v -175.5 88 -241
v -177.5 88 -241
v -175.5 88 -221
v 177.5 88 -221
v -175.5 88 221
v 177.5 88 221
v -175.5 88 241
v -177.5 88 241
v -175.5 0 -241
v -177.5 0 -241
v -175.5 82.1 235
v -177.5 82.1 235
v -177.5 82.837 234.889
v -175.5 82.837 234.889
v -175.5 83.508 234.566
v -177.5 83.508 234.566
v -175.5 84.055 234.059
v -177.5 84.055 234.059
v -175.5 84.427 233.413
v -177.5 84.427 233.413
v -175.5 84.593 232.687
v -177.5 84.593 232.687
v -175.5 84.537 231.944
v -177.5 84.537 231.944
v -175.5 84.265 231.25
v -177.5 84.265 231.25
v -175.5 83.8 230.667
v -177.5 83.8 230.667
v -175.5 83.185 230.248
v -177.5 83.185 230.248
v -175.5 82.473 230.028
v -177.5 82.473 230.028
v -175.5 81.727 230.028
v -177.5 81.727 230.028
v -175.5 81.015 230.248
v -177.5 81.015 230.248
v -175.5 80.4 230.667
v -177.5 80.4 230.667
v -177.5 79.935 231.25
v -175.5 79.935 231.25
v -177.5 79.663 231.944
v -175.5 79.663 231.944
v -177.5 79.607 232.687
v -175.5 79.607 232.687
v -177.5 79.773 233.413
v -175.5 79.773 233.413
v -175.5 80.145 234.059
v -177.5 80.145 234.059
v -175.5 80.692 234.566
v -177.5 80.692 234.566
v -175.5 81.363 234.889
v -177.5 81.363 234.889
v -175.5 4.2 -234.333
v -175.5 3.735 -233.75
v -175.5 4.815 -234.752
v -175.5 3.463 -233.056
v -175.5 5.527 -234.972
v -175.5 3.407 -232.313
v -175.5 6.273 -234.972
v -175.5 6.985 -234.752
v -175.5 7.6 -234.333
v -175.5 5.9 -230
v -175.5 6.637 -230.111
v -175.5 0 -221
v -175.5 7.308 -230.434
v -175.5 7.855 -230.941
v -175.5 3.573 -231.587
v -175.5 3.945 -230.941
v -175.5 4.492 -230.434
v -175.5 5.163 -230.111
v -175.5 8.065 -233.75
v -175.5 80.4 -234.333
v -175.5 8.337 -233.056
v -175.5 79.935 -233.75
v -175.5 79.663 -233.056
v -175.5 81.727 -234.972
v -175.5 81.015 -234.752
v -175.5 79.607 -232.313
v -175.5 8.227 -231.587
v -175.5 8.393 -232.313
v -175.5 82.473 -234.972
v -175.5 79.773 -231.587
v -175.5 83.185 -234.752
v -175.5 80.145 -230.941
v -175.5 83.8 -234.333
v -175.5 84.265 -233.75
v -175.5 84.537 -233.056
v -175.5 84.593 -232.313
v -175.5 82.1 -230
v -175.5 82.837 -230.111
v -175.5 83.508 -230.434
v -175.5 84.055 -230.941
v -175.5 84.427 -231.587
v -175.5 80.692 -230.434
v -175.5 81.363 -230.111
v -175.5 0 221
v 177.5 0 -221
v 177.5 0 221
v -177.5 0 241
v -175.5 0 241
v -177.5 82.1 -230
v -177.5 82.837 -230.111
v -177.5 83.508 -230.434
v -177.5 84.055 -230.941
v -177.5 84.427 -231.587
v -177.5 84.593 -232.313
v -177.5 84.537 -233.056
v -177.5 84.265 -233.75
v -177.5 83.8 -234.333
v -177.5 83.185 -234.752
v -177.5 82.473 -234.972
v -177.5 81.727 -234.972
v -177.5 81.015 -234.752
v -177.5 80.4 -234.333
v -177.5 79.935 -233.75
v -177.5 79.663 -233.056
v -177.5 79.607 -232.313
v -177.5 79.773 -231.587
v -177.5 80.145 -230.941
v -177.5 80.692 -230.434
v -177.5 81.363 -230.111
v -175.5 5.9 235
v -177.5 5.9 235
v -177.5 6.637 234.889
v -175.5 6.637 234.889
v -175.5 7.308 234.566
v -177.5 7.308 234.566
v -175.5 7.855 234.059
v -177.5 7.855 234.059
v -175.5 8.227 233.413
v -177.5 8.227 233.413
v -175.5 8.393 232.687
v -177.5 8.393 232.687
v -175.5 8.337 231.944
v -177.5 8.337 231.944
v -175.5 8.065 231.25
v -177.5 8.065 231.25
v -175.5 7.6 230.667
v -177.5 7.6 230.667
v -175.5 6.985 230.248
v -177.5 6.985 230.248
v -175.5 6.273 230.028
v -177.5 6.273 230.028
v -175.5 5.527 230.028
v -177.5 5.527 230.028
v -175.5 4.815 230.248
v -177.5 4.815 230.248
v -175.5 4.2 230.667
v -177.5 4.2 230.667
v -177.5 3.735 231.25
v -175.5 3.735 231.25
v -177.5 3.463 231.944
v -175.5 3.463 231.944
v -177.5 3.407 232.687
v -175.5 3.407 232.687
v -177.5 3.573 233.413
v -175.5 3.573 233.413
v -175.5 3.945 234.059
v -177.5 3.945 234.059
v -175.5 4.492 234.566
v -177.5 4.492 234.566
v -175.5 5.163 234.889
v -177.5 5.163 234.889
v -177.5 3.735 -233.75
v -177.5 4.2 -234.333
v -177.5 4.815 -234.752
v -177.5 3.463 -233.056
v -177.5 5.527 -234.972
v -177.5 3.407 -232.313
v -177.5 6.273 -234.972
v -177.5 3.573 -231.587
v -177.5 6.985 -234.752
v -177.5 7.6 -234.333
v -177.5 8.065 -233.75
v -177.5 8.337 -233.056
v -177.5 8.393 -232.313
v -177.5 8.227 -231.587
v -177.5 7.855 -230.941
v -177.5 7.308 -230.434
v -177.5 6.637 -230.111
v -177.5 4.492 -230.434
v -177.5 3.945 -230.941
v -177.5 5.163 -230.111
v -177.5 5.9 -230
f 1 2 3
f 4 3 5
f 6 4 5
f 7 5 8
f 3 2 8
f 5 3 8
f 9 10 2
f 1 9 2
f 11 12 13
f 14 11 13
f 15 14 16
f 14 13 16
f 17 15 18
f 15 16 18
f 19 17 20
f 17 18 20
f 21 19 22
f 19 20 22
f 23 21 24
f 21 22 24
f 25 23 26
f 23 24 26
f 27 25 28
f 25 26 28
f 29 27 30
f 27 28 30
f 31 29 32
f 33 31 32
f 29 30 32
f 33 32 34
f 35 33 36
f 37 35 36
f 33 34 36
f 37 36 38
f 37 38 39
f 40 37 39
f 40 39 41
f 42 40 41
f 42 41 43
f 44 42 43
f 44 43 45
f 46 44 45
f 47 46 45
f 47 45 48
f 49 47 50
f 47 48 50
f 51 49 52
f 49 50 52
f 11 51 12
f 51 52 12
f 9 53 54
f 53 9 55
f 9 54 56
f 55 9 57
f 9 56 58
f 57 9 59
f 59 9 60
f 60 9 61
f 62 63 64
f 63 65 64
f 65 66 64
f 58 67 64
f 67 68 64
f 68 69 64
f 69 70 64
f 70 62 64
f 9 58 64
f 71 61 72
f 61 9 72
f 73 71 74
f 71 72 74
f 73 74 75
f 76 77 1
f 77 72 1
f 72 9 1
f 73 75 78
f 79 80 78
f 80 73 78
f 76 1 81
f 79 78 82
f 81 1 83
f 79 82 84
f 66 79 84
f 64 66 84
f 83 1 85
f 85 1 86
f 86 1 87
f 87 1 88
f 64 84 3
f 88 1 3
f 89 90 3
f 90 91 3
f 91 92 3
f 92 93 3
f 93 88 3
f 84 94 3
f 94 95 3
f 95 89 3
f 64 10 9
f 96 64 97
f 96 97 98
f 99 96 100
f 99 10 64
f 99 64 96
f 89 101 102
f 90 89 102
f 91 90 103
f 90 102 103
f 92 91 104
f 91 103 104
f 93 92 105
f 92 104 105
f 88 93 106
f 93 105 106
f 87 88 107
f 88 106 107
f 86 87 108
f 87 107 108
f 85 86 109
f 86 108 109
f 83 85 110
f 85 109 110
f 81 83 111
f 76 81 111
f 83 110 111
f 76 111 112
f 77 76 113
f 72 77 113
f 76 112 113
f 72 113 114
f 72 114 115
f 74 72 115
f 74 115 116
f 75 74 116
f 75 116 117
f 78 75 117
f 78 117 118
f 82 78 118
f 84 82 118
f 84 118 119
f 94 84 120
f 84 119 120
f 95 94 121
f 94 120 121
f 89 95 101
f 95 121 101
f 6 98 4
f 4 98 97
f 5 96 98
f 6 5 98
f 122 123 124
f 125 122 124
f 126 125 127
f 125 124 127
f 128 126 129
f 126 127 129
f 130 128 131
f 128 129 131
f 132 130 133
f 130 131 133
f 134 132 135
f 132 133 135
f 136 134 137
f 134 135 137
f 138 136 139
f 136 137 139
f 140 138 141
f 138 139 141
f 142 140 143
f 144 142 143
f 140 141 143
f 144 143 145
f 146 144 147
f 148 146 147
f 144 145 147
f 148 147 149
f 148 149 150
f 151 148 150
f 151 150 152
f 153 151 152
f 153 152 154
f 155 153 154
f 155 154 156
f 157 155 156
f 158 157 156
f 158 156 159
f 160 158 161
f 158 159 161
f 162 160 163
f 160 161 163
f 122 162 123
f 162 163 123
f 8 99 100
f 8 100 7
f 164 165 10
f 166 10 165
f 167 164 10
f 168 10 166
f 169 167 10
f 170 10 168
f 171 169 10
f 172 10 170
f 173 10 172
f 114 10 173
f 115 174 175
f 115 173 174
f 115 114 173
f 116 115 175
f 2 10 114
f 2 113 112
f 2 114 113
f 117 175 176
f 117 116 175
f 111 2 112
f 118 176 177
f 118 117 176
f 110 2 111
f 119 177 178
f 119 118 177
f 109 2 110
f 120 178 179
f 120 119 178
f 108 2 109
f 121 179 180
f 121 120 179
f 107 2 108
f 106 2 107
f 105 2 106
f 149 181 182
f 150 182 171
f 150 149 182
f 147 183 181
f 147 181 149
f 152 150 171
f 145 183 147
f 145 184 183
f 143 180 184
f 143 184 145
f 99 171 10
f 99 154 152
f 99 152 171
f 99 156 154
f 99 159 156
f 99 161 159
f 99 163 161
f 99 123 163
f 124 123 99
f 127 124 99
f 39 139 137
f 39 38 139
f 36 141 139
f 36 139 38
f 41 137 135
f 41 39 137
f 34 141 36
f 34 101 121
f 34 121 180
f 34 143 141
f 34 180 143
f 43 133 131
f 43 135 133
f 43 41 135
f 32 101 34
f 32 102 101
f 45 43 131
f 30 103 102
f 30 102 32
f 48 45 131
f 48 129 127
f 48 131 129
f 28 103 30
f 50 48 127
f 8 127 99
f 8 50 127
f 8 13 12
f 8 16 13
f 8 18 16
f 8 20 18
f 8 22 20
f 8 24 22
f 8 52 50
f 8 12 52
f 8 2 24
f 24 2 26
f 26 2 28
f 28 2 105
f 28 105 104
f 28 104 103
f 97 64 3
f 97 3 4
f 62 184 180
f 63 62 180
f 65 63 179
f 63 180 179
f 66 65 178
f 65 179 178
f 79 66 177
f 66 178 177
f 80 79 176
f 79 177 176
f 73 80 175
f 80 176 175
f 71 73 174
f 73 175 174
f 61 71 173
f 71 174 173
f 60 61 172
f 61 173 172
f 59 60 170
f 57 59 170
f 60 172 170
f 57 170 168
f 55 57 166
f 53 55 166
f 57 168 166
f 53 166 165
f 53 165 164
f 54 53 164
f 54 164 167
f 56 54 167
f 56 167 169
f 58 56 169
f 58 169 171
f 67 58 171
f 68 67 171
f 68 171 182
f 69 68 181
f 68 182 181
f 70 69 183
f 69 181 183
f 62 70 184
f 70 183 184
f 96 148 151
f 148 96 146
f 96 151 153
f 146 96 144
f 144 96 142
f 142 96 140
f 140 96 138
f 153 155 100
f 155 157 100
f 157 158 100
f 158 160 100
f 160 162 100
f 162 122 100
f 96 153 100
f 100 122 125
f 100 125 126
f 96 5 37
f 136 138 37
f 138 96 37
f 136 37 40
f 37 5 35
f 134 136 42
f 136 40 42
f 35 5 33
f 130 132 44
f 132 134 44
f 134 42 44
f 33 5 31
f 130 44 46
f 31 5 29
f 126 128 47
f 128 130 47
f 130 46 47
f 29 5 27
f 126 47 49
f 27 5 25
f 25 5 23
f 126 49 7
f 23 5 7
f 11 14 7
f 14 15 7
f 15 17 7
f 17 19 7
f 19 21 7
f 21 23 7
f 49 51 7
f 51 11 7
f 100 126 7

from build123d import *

# Parameters (mm, degrees)
CROQUIS1_W              = 355
CROQUIS1_H              = 442
SALIENTE_EXTRUIR1_DEPTH = 88
CROQUIS2_W              = 482
CROQUIS2_H              = 88
CROQUIS2_R              = 2.5
SALIENTE_EXTRUIR2_DEPTH = 2


with BuildPart() as part:
    # Croquis1 → Saliente-Extruir1 (new body)
    with BuildSketch(Plane(origin=(0, 0, 0), x_dir=(1, 0, 0), z_dir=(0, 1, 0))):
        Rectangle(CROQUIS1_W, CROQUIS1_H)
    extrude(amount=SALIENTE_EXTRUIR1_DEPTH)

    # Croquis2 → Saliente-Extruir2 (add)
    with BuildSketch(Plane.ZY.offset(177.5)):
        with Locations((0, 44)):
            Rectangle(CROQUIS2_W, CROQUIS2_H)
        with Locations((232.5, 82.1)):
            Circle(CROQUIS2_R, mode=Mode.SUBTRACT)
        with Locations((232.5, 5.9)):
            Circle(CROQUIS2_R, mode=Mode.SUBTRACT)
        with Locations((-232.5, 5.9)):
            Circle(CROQUIS2_R, mode=Mode.SUBTRACT)
        with Locations((-232.5, 82.1)):
            Circle(CROQUIS2_R, mode=Mode.SUBTRACT)
    extrude(amount=-SALIENTE_EXTRUIR2_DEPTH)


solid = part.part
